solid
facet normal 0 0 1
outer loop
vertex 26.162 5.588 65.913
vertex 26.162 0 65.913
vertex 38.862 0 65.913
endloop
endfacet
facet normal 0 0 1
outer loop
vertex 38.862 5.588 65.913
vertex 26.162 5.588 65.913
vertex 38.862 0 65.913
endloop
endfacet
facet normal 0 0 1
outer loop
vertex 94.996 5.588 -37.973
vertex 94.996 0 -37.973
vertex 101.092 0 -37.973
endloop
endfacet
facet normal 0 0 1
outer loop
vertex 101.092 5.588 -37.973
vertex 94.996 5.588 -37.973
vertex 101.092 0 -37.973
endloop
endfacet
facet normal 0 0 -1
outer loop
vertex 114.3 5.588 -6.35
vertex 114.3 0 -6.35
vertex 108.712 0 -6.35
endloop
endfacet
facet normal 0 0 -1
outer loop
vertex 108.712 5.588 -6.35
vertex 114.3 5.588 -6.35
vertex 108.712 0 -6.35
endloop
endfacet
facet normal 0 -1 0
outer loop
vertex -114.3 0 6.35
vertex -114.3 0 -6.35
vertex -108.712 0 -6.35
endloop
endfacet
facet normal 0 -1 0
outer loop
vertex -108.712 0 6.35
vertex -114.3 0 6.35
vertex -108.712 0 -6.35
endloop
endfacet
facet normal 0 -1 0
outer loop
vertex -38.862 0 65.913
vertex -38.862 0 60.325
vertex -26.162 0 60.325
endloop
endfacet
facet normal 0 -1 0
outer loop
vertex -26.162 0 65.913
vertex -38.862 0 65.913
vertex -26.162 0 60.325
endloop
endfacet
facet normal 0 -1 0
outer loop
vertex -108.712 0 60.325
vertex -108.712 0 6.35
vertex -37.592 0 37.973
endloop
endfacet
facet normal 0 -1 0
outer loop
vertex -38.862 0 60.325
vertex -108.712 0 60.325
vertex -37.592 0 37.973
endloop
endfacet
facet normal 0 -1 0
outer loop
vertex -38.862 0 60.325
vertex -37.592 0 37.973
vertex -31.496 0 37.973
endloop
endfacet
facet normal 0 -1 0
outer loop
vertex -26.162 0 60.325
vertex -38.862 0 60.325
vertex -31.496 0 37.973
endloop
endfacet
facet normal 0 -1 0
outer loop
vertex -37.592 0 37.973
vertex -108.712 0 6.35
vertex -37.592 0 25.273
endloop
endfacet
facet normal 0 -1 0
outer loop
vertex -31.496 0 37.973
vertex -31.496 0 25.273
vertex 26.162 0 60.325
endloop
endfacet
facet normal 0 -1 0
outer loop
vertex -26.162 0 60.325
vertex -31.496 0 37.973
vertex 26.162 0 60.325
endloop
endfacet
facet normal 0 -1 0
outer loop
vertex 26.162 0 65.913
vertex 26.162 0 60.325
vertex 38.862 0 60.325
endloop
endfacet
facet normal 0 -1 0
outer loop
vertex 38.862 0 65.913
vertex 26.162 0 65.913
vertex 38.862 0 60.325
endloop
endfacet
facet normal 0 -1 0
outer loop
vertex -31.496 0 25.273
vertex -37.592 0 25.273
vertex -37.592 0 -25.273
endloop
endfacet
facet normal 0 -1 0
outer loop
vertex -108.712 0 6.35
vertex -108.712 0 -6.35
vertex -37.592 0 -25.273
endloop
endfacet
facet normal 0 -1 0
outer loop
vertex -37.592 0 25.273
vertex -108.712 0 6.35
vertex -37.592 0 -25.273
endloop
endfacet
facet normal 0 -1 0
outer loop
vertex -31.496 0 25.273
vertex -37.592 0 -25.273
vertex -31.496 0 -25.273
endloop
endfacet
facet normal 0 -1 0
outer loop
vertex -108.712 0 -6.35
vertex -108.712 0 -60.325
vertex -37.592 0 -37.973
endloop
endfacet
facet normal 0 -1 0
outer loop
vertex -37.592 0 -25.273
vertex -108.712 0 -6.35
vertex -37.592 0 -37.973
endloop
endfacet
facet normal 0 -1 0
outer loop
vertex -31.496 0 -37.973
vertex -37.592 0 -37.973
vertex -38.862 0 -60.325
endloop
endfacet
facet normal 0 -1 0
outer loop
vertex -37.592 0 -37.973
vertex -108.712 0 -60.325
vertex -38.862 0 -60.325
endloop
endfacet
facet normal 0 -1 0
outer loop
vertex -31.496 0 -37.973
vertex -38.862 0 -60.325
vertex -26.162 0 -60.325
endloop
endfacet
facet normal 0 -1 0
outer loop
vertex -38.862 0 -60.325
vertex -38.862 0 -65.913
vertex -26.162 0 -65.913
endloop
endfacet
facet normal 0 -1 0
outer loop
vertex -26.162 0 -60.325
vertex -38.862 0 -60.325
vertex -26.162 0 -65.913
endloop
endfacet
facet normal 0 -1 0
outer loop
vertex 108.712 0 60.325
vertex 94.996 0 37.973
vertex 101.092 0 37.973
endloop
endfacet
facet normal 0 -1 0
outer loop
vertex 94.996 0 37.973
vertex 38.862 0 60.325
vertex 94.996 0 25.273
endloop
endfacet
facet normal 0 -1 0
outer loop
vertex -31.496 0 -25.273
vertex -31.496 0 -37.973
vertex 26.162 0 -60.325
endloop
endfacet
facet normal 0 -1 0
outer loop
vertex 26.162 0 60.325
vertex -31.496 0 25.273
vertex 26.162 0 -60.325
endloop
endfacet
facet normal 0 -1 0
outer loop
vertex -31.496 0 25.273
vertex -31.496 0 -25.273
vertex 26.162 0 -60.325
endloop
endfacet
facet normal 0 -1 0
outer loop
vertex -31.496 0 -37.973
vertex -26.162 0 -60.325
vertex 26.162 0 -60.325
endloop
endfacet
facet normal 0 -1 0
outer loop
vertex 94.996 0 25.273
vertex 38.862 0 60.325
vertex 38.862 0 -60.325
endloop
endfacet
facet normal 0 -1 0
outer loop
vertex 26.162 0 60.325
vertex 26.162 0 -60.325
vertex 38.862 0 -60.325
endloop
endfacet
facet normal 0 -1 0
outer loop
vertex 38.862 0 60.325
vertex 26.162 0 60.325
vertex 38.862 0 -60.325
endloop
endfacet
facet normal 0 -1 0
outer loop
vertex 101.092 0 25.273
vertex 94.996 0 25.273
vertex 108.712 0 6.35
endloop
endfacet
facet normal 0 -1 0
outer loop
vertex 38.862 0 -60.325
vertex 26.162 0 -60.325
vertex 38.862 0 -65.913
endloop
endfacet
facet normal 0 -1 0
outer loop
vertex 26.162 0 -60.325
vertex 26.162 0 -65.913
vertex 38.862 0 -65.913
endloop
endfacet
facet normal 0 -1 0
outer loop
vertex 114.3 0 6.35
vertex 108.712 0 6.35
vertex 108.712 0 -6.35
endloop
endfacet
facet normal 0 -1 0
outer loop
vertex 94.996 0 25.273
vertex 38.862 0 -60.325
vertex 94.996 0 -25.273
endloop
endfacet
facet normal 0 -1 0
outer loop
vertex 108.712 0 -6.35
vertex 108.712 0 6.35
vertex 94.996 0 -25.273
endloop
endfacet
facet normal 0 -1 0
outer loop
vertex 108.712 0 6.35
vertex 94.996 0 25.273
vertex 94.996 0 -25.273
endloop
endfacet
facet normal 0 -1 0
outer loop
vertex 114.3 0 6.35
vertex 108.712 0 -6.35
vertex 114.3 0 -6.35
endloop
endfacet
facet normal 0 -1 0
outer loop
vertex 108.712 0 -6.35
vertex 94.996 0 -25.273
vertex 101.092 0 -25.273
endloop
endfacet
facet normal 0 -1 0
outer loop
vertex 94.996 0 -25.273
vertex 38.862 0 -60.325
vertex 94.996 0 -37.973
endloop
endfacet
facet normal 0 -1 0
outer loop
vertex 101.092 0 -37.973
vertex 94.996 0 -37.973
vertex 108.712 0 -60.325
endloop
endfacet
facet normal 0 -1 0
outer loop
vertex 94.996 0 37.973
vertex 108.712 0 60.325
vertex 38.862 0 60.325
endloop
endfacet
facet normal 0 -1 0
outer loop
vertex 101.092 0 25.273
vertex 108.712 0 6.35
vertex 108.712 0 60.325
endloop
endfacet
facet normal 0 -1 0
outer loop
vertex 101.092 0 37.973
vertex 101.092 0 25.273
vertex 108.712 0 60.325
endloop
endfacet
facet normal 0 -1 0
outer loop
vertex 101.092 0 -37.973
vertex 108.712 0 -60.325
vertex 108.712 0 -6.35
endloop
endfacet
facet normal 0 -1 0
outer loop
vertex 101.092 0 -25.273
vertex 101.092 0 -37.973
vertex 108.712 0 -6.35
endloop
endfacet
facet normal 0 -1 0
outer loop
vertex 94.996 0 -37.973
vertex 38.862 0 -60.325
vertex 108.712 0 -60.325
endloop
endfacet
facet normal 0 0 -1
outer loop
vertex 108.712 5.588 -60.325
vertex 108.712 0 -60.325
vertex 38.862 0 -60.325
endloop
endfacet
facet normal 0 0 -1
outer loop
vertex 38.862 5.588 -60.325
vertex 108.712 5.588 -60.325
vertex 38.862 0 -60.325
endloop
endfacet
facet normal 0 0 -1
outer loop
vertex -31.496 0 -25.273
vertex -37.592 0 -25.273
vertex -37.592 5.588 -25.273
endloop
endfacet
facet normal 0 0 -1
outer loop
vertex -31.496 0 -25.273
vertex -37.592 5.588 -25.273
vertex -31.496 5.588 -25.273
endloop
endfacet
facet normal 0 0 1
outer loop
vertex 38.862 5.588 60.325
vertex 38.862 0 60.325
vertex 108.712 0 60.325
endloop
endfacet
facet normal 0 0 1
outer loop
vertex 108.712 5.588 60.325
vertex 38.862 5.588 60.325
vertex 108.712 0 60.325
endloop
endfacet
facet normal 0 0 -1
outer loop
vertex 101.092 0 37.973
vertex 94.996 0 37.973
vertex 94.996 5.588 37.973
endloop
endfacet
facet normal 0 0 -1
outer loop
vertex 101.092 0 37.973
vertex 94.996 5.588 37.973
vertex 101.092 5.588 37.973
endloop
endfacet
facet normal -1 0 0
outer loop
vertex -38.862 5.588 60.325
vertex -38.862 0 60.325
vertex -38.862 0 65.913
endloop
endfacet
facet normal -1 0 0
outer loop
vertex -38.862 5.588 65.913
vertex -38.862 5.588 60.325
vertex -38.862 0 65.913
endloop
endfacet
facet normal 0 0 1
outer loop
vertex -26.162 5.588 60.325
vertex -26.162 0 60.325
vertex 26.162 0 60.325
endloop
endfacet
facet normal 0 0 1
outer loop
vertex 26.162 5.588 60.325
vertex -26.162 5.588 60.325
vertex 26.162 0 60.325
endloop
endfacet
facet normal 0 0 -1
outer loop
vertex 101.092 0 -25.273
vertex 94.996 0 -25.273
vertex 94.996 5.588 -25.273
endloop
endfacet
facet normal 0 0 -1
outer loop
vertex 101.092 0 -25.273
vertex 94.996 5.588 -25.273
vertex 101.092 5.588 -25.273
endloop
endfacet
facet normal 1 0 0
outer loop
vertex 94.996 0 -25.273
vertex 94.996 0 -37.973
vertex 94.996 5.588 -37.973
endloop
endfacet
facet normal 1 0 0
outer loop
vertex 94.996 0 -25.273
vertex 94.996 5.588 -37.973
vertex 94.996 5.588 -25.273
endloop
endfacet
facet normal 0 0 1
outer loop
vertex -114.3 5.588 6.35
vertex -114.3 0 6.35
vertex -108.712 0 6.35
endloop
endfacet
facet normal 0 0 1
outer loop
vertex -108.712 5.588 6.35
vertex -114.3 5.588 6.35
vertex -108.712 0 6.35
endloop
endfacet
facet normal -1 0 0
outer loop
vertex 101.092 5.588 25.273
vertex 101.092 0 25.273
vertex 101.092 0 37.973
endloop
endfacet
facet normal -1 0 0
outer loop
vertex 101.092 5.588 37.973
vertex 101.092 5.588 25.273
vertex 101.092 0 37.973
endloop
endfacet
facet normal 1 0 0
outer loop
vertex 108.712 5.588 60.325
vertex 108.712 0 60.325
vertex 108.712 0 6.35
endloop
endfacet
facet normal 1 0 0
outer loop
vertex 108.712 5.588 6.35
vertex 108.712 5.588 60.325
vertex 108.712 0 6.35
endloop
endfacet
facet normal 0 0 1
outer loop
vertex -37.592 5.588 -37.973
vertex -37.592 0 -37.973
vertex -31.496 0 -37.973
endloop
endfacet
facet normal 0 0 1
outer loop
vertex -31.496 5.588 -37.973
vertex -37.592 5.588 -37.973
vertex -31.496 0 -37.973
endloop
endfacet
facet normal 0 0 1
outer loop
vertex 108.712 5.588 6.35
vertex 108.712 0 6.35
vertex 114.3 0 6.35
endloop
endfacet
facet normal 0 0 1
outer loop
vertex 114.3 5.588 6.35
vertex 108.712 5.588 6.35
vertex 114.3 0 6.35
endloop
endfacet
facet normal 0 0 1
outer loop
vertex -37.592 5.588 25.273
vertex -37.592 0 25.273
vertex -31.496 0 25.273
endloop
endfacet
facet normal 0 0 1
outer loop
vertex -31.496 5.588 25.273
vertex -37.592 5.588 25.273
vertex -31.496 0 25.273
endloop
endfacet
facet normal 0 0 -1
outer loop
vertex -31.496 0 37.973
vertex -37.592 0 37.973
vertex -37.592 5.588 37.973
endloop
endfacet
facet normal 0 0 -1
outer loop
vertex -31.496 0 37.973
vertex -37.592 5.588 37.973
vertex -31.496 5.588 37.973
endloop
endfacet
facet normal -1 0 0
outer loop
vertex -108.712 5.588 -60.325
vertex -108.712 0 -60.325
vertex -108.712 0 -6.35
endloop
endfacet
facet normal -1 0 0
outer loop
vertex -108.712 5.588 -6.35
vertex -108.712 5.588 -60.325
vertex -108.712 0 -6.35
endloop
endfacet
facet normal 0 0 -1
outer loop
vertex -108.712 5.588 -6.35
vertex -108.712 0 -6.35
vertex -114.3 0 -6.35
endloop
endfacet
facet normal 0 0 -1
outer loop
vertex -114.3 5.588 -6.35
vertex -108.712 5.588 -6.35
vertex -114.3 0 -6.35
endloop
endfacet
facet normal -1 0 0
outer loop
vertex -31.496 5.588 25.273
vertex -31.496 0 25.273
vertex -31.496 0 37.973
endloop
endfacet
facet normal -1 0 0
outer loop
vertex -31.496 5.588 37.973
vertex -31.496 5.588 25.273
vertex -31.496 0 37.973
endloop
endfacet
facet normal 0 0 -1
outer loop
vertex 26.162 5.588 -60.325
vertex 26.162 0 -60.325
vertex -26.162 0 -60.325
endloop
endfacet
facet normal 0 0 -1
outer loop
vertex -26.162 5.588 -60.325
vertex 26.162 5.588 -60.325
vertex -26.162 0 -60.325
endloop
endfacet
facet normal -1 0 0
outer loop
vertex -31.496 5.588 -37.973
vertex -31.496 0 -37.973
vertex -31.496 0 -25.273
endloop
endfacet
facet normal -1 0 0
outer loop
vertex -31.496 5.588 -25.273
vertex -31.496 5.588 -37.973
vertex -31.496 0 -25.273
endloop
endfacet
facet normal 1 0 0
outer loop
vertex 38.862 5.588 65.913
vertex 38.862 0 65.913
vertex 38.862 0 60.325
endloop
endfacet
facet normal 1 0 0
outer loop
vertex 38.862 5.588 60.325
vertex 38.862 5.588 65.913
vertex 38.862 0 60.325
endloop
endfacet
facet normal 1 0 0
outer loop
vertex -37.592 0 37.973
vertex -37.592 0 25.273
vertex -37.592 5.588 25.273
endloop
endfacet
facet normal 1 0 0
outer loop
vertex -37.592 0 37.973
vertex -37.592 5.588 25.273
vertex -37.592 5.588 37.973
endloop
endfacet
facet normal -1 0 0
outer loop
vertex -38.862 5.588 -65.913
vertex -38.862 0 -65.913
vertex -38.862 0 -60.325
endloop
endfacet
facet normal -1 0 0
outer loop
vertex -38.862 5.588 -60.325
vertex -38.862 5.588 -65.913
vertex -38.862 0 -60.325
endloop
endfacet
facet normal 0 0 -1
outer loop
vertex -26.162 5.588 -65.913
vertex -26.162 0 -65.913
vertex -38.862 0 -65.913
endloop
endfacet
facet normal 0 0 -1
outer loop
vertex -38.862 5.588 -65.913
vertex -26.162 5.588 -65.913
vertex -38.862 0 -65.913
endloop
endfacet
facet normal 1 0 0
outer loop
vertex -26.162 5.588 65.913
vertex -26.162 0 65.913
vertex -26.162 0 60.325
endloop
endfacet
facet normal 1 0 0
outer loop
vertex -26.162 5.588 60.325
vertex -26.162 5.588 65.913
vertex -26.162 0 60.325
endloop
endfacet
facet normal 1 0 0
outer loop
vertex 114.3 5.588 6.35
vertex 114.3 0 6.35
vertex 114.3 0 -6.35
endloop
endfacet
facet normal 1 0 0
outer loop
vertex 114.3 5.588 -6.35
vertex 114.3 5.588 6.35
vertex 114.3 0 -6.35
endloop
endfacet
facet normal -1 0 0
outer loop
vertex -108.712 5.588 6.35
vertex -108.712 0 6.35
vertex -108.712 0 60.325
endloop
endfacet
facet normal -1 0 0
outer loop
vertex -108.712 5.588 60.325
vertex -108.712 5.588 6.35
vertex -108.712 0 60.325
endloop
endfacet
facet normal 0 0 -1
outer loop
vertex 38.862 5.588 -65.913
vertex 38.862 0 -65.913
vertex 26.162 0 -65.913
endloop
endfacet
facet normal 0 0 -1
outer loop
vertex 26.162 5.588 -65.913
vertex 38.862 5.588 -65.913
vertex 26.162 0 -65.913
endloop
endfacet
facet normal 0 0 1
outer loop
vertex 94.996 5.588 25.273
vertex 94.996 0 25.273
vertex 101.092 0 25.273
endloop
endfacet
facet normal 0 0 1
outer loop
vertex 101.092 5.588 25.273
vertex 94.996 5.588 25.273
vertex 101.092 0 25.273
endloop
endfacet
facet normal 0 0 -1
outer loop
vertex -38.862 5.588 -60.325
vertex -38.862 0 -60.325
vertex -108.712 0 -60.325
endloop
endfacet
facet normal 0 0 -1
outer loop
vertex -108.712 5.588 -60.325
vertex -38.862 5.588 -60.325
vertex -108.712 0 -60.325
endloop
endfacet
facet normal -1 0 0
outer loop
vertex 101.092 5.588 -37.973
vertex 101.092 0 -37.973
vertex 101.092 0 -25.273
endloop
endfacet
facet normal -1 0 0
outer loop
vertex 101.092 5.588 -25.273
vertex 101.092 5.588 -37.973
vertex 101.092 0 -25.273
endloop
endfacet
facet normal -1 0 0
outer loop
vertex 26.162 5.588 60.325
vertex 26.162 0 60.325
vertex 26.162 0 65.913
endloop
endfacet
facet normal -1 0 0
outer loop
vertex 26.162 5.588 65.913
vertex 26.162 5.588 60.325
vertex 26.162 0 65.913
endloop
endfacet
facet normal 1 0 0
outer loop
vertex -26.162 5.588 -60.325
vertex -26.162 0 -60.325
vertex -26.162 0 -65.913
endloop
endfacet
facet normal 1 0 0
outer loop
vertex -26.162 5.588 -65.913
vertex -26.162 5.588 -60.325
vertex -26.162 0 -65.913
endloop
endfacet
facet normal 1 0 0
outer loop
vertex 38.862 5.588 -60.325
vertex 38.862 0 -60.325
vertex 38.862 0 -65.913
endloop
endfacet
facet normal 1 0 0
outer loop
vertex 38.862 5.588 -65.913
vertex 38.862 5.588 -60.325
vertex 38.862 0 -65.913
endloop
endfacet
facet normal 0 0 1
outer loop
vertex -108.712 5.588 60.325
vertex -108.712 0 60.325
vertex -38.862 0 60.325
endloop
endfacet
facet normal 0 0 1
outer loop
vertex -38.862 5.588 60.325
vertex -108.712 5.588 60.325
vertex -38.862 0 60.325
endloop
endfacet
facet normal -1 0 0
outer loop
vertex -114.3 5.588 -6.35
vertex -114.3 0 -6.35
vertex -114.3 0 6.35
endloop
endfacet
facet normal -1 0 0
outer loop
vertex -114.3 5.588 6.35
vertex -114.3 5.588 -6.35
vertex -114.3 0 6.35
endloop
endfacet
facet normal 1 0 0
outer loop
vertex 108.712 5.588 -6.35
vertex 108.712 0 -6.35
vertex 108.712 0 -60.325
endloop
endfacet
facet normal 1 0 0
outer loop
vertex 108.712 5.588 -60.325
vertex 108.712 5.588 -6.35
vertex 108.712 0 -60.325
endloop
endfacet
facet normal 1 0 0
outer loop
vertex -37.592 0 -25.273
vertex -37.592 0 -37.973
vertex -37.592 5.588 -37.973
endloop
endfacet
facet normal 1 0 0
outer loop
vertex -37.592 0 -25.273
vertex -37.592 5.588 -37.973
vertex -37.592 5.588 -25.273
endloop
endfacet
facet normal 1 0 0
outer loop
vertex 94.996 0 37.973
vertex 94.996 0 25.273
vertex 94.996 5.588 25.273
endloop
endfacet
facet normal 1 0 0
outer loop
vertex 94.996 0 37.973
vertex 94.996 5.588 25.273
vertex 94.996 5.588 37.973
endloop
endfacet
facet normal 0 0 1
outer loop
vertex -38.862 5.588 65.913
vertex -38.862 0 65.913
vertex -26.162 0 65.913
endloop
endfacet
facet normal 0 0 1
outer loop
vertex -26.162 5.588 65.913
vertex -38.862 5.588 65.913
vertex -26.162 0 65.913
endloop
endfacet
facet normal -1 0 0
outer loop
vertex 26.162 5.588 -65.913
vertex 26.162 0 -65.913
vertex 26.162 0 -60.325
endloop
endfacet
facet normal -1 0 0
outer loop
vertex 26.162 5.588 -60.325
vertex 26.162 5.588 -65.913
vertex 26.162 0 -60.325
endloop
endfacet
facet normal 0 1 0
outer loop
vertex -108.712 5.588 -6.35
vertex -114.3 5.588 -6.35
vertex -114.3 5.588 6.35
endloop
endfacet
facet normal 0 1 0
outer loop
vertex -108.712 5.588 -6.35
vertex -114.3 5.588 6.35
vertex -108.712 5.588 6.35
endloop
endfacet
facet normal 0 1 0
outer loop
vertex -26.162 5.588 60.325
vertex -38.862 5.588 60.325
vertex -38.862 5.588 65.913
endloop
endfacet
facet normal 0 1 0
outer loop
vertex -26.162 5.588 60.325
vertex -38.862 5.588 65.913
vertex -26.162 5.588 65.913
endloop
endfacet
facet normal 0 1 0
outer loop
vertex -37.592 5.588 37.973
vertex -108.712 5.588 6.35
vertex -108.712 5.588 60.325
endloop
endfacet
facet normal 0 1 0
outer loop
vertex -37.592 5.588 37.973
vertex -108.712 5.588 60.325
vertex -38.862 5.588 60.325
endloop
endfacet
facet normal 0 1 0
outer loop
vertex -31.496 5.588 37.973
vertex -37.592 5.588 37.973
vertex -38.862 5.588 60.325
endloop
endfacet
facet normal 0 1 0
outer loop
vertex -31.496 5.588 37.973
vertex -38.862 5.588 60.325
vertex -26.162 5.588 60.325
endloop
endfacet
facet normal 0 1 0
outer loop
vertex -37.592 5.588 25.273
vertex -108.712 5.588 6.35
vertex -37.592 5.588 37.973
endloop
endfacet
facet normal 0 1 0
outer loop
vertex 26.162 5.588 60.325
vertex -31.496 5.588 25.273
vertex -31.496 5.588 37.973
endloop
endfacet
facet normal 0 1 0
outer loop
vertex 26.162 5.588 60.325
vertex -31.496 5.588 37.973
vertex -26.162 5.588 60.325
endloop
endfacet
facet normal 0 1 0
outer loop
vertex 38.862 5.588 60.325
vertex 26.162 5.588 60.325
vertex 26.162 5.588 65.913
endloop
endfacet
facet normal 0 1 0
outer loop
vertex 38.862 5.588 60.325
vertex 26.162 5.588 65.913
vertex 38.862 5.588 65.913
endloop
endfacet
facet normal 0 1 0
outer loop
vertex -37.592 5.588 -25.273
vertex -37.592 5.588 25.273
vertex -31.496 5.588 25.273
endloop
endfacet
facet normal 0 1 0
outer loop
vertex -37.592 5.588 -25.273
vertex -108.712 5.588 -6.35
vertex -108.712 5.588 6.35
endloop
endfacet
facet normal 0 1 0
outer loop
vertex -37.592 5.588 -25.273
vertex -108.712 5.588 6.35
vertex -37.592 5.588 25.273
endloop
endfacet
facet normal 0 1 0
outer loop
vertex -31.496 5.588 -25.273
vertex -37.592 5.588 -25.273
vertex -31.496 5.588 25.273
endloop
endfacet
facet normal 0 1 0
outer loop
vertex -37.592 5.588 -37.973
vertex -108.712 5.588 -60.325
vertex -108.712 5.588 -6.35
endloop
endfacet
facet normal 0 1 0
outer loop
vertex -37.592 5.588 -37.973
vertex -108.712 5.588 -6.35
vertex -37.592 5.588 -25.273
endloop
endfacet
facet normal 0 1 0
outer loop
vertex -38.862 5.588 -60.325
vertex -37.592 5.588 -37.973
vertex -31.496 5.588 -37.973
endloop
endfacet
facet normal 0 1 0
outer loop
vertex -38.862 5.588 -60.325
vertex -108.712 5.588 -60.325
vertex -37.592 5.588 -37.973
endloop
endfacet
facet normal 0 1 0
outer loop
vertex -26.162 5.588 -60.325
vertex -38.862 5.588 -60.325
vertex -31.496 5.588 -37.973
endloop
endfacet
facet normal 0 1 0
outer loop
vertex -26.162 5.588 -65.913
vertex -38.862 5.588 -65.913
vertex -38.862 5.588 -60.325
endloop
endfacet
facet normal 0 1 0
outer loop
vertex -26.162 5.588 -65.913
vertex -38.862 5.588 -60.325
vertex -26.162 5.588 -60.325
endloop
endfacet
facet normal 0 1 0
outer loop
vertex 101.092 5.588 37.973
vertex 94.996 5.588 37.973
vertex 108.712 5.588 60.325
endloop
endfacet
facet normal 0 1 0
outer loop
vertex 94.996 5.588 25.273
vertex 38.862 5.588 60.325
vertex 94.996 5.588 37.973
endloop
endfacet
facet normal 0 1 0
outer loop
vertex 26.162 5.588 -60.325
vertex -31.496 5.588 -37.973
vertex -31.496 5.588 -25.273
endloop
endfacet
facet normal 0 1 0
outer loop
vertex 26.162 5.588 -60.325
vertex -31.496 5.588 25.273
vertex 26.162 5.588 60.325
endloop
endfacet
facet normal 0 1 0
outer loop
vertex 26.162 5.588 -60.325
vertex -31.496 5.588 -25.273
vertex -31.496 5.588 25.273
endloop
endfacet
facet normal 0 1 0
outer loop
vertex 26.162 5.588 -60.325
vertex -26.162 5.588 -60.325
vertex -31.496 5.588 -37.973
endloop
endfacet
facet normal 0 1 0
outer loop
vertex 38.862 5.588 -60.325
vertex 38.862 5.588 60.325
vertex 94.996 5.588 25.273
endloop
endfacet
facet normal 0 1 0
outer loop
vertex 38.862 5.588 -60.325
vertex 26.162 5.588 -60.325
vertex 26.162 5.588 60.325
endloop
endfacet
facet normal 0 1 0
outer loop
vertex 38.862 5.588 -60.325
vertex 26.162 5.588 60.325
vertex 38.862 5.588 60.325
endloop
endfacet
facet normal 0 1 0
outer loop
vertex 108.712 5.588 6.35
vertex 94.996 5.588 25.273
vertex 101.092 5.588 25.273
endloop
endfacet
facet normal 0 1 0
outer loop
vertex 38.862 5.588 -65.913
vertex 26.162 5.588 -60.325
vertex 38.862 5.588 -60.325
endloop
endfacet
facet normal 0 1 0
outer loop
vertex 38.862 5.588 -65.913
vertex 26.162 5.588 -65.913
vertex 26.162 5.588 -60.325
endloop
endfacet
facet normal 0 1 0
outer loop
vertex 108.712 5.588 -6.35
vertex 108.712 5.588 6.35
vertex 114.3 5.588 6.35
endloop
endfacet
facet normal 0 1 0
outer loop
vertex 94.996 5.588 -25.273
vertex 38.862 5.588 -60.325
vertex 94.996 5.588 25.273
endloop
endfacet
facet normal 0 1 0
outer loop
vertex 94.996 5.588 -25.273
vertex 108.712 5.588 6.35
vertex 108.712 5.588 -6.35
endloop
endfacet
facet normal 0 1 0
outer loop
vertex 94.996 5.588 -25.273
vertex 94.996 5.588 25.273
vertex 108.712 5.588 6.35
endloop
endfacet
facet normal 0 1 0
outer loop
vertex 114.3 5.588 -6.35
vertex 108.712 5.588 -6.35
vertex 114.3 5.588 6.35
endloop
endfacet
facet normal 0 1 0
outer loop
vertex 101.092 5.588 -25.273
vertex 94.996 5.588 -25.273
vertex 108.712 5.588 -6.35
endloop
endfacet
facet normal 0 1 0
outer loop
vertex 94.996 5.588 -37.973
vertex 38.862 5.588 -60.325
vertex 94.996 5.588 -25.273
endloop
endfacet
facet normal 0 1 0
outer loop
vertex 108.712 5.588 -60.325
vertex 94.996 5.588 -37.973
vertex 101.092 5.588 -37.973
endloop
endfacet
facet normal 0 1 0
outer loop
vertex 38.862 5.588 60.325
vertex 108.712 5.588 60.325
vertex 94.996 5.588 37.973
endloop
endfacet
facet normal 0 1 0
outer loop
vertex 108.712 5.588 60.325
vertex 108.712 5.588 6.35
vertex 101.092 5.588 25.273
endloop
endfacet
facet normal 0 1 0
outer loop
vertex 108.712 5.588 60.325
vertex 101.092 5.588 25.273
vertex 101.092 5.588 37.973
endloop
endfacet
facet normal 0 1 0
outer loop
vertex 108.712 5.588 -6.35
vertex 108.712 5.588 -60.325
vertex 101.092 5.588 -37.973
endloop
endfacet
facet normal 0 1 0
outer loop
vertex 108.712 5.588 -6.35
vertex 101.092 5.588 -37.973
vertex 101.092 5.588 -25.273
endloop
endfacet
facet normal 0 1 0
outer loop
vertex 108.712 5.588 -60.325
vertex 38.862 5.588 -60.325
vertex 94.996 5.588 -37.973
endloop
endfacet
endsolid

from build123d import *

# Parameters (mm, degrees)
BOSS_EXTRUDE1_DEPTH = 5.588
SKETCH2_W           = 6.096
SKETCH2_H           = 12.7
CUT_EXTRUDE1_DEPTH  = 5.588


with BuildPart() as part:
    # Sketch1 → Boss-Extrude1 (new body)
    with BuildSketch(Plane(origin=(0, 0, 0), x_dir=(1, 0, 0), z_dir=(0, 1, 0))):
        Polygon((-108.712, 6.35), (-114.3, 6.35), (-114.3, -6.35), (-108.712, -6.35), (-108.712, -60.325), (-38.862, -60.325), (-38.862, -65.913), (-26.162, -65.913), (-26.162, -60.325), (26.162, -60.325), (26.162, -65.913), (38.862, -65.913), (38.862, -60.325), (108.712, -60.325), (108.712, -6.35), (114.3, -6.35), (114.3, 6.35), (108.712, 6.35), (108.712, 60.325), (38.862, 60.325), (38.862, 65.913), (26.162, 65.913), (26.162, 60.325), (-26.162, 60.325), (-26.162, 65.913), (-38.862, 65.913), (-38.862, 60.325), (-108.712, 60.325), align=None)
    extrude(amount=BOSS_EXTRUDE1_DEPTH)

    # Sketch2 → Cut-Extrude1 (cut)
    with BuildSketch(Plane.XZ):
        with Locations((-34.544, 31.623)):
            Rectangle(SKETCH2_W, SKETCH2_H)
        with Locations((98.044, 31.623)):
            Rectangle(SKETCH2_W, SKETCH2_H)
        with Locations((98.044, -31.623)):
            Rectangle(SKETCH2_W, SKETCH2_H)
        with Locations((-34.544, -31.623)):
            Rectangle(SKETCH2_W, SKETCH2_H)
    extrude(amount=-CUT_EXTRUDE1_DEPTH, mode=Mode.SUBTRACT)


solid = part.part
